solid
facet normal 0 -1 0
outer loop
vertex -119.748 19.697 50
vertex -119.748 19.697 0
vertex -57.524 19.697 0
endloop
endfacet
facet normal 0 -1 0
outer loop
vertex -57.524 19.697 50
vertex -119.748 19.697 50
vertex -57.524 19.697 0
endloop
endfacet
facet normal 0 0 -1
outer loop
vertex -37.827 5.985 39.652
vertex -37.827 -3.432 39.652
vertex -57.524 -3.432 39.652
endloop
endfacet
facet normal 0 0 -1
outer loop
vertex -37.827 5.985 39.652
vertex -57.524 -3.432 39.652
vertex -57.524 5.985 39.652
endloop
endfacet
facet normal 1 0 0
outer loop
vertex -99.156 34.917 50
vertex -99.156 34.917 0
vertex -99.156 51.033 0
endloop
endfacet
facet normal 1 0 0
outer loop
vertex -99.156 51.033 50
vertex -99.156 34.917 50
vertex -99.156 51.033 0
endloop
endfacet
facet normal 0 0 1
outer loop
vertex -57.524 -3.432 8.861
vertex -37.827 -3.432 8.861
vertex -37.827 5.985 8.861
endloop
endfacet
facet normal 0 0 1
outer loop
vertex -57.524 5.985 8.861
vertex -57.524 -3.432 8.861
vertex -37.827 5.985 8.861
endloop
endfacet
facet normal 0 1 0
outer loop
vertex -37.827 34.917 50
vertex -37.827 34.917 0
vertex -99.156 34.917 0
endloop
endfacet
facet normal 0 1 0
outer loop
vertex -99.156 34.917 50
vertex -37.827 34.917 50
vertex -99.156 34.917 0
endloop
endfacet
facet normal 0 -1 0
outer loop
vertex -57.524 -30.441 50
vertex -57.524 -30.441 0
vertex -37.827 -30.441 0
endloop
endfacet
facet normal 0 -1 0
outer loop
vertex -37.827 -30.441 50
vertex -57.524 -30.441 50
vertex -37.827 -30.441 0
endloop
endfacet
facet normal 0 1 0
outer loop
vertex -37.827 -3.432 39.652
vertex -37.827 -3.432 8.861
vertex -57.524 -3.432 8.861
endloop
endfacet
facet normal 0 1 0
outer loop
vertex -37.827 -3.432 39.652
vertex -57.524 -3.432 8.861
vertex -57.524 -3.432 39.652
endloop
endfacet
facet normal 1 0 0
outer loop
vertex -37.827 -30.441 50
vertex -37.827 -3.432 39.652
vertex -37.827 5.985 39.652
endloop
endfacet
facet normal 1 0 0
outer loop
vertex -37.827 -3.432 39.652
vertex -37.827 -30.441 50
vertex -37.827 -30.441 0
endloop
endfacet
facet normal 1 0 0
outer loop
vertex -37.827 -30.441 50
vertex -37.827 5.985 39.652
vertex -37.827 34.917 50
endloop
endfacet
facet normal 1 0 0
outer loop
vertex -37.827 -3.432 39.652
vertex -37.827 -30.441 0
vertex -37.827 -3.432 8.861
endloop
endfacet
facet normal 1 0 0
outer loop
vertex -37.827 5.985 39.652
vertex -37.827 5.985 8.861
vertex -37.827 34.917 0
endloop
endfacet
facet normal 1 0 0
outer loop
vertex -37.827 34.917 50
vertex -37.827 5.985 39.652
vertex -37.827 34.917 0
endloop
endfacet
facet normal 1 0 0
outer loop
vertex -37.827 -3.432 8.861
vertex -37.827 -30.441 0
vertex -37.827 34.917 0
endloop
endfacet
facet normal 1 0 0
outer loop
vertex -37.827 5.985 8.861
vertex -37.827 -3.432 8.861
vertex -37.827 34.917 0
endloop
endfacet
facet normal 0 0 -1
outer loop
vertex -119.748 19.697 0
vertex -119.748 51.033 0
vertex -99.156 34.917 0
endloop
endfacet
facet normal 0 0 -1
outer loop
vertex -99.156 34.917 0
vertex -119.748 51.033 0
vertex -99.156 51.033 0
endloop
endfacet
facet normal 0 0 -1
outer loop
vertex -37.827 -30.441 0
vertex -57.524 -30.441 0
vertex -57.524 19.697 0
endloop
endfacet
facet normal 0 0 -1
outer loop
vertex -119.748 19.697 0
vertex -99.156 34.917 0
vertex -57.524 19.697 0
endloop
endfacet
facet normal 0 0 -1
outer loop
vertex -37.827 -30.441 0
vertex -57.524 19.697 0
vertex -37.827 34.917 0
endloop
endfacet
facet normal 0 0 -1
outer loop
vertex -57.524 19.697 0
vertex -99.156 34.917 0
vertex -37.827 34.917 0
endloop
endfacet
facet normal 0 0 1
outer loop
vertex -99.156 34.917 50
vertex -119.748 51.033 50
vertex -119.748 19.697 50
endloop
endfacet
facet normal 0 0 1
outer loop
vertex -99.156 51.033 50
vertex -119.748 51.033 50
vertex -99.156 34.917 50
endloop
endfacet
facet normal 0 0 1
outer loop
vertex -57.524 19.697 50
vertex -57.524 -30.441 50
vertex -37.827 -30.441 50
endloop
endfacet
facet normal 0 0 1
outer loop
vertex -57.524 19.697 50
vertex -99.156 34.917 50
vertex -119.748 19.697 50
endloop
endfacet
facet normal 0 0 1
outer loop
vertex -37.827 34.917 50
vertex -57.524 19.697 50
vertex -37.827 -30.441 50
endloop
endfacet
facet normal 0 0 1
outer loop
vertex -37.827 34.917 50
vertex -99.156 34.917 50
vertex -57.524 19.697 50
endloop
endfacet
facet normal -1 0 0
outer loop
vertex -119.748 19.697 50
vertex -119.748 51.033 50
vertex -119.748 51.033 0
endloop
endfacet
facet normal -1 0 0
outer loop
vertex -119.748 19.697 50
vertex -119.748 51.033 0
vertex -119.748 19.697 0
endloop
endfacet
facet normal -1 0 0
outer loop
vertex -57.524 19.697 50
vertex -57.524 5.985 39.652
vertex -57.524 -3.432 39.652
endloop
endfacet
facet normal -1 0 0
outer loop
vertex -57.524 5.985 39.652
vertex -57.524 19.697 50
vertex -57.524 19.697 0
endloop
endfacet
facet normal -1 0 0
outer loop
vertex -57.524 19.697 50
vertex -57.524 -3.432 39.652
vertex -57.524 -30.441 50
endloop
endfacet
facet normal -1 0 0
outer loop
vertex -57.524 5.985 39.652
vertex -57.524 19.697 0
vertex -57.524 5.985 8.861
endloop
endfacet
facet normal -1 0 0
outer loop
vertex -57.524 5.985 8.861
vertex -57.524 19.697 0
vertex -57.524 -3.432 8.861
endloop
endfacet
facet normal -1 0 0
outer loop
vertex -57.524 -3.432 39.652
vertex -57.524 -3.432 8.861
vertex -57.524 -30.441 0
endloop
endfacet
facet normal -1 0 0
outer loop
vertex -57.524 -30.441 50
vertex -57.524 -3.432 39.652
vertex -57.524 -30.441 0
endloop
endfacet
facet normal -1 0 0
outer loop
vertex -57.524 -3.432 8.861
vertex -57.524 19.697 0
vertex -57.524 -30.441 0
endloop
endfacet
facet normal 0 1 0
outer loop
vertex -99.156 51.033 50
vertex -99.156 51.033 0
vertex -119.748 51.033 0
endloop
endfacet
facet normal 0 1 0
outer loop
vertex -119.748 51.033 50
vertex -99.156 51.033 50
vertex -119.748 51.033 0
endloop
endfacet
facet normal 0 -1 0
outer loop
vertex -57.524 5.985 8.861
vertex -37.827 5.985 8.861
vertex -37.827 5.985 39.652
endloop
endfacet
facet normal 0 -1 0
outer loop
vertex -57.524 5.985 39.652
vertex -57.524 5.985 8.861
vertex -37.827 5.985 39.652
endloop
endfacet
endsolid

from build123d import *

# Parameters (mm, degrees)
F1_DEPTH = 50
F2_W     = 9.416695
F2_H     = 30.791057
F3_DEPTH = 25


with BuildPart() as f1:
    # F0 (on Top) → F1 (new body)
    with BuildSketch(Plane.XY):
        Polygon((-99.156201, 51.032986), (-119.748466, 51.032986), (-119.748466, 19.696943), (-57.524025, 19.696943), (-57.524025, -30.440733), (-37.827082, -30.440733), (-37.827082, 34.917306), (-99.156201, 34.917306), align=None)
    extrude(amount=F1_DEPTH)

    # F2 (on face) → F3 (cut)
    with BuildSketch(Plane.YZ.offset(-37.827082)):
        with Locations((1.276812, 24.256223)):
            Rectangle(F2_W, F2_H)
    extrude(amount=-F3_DEPTH, mode=Mode.SUBTRACT)


solid = f1.part
